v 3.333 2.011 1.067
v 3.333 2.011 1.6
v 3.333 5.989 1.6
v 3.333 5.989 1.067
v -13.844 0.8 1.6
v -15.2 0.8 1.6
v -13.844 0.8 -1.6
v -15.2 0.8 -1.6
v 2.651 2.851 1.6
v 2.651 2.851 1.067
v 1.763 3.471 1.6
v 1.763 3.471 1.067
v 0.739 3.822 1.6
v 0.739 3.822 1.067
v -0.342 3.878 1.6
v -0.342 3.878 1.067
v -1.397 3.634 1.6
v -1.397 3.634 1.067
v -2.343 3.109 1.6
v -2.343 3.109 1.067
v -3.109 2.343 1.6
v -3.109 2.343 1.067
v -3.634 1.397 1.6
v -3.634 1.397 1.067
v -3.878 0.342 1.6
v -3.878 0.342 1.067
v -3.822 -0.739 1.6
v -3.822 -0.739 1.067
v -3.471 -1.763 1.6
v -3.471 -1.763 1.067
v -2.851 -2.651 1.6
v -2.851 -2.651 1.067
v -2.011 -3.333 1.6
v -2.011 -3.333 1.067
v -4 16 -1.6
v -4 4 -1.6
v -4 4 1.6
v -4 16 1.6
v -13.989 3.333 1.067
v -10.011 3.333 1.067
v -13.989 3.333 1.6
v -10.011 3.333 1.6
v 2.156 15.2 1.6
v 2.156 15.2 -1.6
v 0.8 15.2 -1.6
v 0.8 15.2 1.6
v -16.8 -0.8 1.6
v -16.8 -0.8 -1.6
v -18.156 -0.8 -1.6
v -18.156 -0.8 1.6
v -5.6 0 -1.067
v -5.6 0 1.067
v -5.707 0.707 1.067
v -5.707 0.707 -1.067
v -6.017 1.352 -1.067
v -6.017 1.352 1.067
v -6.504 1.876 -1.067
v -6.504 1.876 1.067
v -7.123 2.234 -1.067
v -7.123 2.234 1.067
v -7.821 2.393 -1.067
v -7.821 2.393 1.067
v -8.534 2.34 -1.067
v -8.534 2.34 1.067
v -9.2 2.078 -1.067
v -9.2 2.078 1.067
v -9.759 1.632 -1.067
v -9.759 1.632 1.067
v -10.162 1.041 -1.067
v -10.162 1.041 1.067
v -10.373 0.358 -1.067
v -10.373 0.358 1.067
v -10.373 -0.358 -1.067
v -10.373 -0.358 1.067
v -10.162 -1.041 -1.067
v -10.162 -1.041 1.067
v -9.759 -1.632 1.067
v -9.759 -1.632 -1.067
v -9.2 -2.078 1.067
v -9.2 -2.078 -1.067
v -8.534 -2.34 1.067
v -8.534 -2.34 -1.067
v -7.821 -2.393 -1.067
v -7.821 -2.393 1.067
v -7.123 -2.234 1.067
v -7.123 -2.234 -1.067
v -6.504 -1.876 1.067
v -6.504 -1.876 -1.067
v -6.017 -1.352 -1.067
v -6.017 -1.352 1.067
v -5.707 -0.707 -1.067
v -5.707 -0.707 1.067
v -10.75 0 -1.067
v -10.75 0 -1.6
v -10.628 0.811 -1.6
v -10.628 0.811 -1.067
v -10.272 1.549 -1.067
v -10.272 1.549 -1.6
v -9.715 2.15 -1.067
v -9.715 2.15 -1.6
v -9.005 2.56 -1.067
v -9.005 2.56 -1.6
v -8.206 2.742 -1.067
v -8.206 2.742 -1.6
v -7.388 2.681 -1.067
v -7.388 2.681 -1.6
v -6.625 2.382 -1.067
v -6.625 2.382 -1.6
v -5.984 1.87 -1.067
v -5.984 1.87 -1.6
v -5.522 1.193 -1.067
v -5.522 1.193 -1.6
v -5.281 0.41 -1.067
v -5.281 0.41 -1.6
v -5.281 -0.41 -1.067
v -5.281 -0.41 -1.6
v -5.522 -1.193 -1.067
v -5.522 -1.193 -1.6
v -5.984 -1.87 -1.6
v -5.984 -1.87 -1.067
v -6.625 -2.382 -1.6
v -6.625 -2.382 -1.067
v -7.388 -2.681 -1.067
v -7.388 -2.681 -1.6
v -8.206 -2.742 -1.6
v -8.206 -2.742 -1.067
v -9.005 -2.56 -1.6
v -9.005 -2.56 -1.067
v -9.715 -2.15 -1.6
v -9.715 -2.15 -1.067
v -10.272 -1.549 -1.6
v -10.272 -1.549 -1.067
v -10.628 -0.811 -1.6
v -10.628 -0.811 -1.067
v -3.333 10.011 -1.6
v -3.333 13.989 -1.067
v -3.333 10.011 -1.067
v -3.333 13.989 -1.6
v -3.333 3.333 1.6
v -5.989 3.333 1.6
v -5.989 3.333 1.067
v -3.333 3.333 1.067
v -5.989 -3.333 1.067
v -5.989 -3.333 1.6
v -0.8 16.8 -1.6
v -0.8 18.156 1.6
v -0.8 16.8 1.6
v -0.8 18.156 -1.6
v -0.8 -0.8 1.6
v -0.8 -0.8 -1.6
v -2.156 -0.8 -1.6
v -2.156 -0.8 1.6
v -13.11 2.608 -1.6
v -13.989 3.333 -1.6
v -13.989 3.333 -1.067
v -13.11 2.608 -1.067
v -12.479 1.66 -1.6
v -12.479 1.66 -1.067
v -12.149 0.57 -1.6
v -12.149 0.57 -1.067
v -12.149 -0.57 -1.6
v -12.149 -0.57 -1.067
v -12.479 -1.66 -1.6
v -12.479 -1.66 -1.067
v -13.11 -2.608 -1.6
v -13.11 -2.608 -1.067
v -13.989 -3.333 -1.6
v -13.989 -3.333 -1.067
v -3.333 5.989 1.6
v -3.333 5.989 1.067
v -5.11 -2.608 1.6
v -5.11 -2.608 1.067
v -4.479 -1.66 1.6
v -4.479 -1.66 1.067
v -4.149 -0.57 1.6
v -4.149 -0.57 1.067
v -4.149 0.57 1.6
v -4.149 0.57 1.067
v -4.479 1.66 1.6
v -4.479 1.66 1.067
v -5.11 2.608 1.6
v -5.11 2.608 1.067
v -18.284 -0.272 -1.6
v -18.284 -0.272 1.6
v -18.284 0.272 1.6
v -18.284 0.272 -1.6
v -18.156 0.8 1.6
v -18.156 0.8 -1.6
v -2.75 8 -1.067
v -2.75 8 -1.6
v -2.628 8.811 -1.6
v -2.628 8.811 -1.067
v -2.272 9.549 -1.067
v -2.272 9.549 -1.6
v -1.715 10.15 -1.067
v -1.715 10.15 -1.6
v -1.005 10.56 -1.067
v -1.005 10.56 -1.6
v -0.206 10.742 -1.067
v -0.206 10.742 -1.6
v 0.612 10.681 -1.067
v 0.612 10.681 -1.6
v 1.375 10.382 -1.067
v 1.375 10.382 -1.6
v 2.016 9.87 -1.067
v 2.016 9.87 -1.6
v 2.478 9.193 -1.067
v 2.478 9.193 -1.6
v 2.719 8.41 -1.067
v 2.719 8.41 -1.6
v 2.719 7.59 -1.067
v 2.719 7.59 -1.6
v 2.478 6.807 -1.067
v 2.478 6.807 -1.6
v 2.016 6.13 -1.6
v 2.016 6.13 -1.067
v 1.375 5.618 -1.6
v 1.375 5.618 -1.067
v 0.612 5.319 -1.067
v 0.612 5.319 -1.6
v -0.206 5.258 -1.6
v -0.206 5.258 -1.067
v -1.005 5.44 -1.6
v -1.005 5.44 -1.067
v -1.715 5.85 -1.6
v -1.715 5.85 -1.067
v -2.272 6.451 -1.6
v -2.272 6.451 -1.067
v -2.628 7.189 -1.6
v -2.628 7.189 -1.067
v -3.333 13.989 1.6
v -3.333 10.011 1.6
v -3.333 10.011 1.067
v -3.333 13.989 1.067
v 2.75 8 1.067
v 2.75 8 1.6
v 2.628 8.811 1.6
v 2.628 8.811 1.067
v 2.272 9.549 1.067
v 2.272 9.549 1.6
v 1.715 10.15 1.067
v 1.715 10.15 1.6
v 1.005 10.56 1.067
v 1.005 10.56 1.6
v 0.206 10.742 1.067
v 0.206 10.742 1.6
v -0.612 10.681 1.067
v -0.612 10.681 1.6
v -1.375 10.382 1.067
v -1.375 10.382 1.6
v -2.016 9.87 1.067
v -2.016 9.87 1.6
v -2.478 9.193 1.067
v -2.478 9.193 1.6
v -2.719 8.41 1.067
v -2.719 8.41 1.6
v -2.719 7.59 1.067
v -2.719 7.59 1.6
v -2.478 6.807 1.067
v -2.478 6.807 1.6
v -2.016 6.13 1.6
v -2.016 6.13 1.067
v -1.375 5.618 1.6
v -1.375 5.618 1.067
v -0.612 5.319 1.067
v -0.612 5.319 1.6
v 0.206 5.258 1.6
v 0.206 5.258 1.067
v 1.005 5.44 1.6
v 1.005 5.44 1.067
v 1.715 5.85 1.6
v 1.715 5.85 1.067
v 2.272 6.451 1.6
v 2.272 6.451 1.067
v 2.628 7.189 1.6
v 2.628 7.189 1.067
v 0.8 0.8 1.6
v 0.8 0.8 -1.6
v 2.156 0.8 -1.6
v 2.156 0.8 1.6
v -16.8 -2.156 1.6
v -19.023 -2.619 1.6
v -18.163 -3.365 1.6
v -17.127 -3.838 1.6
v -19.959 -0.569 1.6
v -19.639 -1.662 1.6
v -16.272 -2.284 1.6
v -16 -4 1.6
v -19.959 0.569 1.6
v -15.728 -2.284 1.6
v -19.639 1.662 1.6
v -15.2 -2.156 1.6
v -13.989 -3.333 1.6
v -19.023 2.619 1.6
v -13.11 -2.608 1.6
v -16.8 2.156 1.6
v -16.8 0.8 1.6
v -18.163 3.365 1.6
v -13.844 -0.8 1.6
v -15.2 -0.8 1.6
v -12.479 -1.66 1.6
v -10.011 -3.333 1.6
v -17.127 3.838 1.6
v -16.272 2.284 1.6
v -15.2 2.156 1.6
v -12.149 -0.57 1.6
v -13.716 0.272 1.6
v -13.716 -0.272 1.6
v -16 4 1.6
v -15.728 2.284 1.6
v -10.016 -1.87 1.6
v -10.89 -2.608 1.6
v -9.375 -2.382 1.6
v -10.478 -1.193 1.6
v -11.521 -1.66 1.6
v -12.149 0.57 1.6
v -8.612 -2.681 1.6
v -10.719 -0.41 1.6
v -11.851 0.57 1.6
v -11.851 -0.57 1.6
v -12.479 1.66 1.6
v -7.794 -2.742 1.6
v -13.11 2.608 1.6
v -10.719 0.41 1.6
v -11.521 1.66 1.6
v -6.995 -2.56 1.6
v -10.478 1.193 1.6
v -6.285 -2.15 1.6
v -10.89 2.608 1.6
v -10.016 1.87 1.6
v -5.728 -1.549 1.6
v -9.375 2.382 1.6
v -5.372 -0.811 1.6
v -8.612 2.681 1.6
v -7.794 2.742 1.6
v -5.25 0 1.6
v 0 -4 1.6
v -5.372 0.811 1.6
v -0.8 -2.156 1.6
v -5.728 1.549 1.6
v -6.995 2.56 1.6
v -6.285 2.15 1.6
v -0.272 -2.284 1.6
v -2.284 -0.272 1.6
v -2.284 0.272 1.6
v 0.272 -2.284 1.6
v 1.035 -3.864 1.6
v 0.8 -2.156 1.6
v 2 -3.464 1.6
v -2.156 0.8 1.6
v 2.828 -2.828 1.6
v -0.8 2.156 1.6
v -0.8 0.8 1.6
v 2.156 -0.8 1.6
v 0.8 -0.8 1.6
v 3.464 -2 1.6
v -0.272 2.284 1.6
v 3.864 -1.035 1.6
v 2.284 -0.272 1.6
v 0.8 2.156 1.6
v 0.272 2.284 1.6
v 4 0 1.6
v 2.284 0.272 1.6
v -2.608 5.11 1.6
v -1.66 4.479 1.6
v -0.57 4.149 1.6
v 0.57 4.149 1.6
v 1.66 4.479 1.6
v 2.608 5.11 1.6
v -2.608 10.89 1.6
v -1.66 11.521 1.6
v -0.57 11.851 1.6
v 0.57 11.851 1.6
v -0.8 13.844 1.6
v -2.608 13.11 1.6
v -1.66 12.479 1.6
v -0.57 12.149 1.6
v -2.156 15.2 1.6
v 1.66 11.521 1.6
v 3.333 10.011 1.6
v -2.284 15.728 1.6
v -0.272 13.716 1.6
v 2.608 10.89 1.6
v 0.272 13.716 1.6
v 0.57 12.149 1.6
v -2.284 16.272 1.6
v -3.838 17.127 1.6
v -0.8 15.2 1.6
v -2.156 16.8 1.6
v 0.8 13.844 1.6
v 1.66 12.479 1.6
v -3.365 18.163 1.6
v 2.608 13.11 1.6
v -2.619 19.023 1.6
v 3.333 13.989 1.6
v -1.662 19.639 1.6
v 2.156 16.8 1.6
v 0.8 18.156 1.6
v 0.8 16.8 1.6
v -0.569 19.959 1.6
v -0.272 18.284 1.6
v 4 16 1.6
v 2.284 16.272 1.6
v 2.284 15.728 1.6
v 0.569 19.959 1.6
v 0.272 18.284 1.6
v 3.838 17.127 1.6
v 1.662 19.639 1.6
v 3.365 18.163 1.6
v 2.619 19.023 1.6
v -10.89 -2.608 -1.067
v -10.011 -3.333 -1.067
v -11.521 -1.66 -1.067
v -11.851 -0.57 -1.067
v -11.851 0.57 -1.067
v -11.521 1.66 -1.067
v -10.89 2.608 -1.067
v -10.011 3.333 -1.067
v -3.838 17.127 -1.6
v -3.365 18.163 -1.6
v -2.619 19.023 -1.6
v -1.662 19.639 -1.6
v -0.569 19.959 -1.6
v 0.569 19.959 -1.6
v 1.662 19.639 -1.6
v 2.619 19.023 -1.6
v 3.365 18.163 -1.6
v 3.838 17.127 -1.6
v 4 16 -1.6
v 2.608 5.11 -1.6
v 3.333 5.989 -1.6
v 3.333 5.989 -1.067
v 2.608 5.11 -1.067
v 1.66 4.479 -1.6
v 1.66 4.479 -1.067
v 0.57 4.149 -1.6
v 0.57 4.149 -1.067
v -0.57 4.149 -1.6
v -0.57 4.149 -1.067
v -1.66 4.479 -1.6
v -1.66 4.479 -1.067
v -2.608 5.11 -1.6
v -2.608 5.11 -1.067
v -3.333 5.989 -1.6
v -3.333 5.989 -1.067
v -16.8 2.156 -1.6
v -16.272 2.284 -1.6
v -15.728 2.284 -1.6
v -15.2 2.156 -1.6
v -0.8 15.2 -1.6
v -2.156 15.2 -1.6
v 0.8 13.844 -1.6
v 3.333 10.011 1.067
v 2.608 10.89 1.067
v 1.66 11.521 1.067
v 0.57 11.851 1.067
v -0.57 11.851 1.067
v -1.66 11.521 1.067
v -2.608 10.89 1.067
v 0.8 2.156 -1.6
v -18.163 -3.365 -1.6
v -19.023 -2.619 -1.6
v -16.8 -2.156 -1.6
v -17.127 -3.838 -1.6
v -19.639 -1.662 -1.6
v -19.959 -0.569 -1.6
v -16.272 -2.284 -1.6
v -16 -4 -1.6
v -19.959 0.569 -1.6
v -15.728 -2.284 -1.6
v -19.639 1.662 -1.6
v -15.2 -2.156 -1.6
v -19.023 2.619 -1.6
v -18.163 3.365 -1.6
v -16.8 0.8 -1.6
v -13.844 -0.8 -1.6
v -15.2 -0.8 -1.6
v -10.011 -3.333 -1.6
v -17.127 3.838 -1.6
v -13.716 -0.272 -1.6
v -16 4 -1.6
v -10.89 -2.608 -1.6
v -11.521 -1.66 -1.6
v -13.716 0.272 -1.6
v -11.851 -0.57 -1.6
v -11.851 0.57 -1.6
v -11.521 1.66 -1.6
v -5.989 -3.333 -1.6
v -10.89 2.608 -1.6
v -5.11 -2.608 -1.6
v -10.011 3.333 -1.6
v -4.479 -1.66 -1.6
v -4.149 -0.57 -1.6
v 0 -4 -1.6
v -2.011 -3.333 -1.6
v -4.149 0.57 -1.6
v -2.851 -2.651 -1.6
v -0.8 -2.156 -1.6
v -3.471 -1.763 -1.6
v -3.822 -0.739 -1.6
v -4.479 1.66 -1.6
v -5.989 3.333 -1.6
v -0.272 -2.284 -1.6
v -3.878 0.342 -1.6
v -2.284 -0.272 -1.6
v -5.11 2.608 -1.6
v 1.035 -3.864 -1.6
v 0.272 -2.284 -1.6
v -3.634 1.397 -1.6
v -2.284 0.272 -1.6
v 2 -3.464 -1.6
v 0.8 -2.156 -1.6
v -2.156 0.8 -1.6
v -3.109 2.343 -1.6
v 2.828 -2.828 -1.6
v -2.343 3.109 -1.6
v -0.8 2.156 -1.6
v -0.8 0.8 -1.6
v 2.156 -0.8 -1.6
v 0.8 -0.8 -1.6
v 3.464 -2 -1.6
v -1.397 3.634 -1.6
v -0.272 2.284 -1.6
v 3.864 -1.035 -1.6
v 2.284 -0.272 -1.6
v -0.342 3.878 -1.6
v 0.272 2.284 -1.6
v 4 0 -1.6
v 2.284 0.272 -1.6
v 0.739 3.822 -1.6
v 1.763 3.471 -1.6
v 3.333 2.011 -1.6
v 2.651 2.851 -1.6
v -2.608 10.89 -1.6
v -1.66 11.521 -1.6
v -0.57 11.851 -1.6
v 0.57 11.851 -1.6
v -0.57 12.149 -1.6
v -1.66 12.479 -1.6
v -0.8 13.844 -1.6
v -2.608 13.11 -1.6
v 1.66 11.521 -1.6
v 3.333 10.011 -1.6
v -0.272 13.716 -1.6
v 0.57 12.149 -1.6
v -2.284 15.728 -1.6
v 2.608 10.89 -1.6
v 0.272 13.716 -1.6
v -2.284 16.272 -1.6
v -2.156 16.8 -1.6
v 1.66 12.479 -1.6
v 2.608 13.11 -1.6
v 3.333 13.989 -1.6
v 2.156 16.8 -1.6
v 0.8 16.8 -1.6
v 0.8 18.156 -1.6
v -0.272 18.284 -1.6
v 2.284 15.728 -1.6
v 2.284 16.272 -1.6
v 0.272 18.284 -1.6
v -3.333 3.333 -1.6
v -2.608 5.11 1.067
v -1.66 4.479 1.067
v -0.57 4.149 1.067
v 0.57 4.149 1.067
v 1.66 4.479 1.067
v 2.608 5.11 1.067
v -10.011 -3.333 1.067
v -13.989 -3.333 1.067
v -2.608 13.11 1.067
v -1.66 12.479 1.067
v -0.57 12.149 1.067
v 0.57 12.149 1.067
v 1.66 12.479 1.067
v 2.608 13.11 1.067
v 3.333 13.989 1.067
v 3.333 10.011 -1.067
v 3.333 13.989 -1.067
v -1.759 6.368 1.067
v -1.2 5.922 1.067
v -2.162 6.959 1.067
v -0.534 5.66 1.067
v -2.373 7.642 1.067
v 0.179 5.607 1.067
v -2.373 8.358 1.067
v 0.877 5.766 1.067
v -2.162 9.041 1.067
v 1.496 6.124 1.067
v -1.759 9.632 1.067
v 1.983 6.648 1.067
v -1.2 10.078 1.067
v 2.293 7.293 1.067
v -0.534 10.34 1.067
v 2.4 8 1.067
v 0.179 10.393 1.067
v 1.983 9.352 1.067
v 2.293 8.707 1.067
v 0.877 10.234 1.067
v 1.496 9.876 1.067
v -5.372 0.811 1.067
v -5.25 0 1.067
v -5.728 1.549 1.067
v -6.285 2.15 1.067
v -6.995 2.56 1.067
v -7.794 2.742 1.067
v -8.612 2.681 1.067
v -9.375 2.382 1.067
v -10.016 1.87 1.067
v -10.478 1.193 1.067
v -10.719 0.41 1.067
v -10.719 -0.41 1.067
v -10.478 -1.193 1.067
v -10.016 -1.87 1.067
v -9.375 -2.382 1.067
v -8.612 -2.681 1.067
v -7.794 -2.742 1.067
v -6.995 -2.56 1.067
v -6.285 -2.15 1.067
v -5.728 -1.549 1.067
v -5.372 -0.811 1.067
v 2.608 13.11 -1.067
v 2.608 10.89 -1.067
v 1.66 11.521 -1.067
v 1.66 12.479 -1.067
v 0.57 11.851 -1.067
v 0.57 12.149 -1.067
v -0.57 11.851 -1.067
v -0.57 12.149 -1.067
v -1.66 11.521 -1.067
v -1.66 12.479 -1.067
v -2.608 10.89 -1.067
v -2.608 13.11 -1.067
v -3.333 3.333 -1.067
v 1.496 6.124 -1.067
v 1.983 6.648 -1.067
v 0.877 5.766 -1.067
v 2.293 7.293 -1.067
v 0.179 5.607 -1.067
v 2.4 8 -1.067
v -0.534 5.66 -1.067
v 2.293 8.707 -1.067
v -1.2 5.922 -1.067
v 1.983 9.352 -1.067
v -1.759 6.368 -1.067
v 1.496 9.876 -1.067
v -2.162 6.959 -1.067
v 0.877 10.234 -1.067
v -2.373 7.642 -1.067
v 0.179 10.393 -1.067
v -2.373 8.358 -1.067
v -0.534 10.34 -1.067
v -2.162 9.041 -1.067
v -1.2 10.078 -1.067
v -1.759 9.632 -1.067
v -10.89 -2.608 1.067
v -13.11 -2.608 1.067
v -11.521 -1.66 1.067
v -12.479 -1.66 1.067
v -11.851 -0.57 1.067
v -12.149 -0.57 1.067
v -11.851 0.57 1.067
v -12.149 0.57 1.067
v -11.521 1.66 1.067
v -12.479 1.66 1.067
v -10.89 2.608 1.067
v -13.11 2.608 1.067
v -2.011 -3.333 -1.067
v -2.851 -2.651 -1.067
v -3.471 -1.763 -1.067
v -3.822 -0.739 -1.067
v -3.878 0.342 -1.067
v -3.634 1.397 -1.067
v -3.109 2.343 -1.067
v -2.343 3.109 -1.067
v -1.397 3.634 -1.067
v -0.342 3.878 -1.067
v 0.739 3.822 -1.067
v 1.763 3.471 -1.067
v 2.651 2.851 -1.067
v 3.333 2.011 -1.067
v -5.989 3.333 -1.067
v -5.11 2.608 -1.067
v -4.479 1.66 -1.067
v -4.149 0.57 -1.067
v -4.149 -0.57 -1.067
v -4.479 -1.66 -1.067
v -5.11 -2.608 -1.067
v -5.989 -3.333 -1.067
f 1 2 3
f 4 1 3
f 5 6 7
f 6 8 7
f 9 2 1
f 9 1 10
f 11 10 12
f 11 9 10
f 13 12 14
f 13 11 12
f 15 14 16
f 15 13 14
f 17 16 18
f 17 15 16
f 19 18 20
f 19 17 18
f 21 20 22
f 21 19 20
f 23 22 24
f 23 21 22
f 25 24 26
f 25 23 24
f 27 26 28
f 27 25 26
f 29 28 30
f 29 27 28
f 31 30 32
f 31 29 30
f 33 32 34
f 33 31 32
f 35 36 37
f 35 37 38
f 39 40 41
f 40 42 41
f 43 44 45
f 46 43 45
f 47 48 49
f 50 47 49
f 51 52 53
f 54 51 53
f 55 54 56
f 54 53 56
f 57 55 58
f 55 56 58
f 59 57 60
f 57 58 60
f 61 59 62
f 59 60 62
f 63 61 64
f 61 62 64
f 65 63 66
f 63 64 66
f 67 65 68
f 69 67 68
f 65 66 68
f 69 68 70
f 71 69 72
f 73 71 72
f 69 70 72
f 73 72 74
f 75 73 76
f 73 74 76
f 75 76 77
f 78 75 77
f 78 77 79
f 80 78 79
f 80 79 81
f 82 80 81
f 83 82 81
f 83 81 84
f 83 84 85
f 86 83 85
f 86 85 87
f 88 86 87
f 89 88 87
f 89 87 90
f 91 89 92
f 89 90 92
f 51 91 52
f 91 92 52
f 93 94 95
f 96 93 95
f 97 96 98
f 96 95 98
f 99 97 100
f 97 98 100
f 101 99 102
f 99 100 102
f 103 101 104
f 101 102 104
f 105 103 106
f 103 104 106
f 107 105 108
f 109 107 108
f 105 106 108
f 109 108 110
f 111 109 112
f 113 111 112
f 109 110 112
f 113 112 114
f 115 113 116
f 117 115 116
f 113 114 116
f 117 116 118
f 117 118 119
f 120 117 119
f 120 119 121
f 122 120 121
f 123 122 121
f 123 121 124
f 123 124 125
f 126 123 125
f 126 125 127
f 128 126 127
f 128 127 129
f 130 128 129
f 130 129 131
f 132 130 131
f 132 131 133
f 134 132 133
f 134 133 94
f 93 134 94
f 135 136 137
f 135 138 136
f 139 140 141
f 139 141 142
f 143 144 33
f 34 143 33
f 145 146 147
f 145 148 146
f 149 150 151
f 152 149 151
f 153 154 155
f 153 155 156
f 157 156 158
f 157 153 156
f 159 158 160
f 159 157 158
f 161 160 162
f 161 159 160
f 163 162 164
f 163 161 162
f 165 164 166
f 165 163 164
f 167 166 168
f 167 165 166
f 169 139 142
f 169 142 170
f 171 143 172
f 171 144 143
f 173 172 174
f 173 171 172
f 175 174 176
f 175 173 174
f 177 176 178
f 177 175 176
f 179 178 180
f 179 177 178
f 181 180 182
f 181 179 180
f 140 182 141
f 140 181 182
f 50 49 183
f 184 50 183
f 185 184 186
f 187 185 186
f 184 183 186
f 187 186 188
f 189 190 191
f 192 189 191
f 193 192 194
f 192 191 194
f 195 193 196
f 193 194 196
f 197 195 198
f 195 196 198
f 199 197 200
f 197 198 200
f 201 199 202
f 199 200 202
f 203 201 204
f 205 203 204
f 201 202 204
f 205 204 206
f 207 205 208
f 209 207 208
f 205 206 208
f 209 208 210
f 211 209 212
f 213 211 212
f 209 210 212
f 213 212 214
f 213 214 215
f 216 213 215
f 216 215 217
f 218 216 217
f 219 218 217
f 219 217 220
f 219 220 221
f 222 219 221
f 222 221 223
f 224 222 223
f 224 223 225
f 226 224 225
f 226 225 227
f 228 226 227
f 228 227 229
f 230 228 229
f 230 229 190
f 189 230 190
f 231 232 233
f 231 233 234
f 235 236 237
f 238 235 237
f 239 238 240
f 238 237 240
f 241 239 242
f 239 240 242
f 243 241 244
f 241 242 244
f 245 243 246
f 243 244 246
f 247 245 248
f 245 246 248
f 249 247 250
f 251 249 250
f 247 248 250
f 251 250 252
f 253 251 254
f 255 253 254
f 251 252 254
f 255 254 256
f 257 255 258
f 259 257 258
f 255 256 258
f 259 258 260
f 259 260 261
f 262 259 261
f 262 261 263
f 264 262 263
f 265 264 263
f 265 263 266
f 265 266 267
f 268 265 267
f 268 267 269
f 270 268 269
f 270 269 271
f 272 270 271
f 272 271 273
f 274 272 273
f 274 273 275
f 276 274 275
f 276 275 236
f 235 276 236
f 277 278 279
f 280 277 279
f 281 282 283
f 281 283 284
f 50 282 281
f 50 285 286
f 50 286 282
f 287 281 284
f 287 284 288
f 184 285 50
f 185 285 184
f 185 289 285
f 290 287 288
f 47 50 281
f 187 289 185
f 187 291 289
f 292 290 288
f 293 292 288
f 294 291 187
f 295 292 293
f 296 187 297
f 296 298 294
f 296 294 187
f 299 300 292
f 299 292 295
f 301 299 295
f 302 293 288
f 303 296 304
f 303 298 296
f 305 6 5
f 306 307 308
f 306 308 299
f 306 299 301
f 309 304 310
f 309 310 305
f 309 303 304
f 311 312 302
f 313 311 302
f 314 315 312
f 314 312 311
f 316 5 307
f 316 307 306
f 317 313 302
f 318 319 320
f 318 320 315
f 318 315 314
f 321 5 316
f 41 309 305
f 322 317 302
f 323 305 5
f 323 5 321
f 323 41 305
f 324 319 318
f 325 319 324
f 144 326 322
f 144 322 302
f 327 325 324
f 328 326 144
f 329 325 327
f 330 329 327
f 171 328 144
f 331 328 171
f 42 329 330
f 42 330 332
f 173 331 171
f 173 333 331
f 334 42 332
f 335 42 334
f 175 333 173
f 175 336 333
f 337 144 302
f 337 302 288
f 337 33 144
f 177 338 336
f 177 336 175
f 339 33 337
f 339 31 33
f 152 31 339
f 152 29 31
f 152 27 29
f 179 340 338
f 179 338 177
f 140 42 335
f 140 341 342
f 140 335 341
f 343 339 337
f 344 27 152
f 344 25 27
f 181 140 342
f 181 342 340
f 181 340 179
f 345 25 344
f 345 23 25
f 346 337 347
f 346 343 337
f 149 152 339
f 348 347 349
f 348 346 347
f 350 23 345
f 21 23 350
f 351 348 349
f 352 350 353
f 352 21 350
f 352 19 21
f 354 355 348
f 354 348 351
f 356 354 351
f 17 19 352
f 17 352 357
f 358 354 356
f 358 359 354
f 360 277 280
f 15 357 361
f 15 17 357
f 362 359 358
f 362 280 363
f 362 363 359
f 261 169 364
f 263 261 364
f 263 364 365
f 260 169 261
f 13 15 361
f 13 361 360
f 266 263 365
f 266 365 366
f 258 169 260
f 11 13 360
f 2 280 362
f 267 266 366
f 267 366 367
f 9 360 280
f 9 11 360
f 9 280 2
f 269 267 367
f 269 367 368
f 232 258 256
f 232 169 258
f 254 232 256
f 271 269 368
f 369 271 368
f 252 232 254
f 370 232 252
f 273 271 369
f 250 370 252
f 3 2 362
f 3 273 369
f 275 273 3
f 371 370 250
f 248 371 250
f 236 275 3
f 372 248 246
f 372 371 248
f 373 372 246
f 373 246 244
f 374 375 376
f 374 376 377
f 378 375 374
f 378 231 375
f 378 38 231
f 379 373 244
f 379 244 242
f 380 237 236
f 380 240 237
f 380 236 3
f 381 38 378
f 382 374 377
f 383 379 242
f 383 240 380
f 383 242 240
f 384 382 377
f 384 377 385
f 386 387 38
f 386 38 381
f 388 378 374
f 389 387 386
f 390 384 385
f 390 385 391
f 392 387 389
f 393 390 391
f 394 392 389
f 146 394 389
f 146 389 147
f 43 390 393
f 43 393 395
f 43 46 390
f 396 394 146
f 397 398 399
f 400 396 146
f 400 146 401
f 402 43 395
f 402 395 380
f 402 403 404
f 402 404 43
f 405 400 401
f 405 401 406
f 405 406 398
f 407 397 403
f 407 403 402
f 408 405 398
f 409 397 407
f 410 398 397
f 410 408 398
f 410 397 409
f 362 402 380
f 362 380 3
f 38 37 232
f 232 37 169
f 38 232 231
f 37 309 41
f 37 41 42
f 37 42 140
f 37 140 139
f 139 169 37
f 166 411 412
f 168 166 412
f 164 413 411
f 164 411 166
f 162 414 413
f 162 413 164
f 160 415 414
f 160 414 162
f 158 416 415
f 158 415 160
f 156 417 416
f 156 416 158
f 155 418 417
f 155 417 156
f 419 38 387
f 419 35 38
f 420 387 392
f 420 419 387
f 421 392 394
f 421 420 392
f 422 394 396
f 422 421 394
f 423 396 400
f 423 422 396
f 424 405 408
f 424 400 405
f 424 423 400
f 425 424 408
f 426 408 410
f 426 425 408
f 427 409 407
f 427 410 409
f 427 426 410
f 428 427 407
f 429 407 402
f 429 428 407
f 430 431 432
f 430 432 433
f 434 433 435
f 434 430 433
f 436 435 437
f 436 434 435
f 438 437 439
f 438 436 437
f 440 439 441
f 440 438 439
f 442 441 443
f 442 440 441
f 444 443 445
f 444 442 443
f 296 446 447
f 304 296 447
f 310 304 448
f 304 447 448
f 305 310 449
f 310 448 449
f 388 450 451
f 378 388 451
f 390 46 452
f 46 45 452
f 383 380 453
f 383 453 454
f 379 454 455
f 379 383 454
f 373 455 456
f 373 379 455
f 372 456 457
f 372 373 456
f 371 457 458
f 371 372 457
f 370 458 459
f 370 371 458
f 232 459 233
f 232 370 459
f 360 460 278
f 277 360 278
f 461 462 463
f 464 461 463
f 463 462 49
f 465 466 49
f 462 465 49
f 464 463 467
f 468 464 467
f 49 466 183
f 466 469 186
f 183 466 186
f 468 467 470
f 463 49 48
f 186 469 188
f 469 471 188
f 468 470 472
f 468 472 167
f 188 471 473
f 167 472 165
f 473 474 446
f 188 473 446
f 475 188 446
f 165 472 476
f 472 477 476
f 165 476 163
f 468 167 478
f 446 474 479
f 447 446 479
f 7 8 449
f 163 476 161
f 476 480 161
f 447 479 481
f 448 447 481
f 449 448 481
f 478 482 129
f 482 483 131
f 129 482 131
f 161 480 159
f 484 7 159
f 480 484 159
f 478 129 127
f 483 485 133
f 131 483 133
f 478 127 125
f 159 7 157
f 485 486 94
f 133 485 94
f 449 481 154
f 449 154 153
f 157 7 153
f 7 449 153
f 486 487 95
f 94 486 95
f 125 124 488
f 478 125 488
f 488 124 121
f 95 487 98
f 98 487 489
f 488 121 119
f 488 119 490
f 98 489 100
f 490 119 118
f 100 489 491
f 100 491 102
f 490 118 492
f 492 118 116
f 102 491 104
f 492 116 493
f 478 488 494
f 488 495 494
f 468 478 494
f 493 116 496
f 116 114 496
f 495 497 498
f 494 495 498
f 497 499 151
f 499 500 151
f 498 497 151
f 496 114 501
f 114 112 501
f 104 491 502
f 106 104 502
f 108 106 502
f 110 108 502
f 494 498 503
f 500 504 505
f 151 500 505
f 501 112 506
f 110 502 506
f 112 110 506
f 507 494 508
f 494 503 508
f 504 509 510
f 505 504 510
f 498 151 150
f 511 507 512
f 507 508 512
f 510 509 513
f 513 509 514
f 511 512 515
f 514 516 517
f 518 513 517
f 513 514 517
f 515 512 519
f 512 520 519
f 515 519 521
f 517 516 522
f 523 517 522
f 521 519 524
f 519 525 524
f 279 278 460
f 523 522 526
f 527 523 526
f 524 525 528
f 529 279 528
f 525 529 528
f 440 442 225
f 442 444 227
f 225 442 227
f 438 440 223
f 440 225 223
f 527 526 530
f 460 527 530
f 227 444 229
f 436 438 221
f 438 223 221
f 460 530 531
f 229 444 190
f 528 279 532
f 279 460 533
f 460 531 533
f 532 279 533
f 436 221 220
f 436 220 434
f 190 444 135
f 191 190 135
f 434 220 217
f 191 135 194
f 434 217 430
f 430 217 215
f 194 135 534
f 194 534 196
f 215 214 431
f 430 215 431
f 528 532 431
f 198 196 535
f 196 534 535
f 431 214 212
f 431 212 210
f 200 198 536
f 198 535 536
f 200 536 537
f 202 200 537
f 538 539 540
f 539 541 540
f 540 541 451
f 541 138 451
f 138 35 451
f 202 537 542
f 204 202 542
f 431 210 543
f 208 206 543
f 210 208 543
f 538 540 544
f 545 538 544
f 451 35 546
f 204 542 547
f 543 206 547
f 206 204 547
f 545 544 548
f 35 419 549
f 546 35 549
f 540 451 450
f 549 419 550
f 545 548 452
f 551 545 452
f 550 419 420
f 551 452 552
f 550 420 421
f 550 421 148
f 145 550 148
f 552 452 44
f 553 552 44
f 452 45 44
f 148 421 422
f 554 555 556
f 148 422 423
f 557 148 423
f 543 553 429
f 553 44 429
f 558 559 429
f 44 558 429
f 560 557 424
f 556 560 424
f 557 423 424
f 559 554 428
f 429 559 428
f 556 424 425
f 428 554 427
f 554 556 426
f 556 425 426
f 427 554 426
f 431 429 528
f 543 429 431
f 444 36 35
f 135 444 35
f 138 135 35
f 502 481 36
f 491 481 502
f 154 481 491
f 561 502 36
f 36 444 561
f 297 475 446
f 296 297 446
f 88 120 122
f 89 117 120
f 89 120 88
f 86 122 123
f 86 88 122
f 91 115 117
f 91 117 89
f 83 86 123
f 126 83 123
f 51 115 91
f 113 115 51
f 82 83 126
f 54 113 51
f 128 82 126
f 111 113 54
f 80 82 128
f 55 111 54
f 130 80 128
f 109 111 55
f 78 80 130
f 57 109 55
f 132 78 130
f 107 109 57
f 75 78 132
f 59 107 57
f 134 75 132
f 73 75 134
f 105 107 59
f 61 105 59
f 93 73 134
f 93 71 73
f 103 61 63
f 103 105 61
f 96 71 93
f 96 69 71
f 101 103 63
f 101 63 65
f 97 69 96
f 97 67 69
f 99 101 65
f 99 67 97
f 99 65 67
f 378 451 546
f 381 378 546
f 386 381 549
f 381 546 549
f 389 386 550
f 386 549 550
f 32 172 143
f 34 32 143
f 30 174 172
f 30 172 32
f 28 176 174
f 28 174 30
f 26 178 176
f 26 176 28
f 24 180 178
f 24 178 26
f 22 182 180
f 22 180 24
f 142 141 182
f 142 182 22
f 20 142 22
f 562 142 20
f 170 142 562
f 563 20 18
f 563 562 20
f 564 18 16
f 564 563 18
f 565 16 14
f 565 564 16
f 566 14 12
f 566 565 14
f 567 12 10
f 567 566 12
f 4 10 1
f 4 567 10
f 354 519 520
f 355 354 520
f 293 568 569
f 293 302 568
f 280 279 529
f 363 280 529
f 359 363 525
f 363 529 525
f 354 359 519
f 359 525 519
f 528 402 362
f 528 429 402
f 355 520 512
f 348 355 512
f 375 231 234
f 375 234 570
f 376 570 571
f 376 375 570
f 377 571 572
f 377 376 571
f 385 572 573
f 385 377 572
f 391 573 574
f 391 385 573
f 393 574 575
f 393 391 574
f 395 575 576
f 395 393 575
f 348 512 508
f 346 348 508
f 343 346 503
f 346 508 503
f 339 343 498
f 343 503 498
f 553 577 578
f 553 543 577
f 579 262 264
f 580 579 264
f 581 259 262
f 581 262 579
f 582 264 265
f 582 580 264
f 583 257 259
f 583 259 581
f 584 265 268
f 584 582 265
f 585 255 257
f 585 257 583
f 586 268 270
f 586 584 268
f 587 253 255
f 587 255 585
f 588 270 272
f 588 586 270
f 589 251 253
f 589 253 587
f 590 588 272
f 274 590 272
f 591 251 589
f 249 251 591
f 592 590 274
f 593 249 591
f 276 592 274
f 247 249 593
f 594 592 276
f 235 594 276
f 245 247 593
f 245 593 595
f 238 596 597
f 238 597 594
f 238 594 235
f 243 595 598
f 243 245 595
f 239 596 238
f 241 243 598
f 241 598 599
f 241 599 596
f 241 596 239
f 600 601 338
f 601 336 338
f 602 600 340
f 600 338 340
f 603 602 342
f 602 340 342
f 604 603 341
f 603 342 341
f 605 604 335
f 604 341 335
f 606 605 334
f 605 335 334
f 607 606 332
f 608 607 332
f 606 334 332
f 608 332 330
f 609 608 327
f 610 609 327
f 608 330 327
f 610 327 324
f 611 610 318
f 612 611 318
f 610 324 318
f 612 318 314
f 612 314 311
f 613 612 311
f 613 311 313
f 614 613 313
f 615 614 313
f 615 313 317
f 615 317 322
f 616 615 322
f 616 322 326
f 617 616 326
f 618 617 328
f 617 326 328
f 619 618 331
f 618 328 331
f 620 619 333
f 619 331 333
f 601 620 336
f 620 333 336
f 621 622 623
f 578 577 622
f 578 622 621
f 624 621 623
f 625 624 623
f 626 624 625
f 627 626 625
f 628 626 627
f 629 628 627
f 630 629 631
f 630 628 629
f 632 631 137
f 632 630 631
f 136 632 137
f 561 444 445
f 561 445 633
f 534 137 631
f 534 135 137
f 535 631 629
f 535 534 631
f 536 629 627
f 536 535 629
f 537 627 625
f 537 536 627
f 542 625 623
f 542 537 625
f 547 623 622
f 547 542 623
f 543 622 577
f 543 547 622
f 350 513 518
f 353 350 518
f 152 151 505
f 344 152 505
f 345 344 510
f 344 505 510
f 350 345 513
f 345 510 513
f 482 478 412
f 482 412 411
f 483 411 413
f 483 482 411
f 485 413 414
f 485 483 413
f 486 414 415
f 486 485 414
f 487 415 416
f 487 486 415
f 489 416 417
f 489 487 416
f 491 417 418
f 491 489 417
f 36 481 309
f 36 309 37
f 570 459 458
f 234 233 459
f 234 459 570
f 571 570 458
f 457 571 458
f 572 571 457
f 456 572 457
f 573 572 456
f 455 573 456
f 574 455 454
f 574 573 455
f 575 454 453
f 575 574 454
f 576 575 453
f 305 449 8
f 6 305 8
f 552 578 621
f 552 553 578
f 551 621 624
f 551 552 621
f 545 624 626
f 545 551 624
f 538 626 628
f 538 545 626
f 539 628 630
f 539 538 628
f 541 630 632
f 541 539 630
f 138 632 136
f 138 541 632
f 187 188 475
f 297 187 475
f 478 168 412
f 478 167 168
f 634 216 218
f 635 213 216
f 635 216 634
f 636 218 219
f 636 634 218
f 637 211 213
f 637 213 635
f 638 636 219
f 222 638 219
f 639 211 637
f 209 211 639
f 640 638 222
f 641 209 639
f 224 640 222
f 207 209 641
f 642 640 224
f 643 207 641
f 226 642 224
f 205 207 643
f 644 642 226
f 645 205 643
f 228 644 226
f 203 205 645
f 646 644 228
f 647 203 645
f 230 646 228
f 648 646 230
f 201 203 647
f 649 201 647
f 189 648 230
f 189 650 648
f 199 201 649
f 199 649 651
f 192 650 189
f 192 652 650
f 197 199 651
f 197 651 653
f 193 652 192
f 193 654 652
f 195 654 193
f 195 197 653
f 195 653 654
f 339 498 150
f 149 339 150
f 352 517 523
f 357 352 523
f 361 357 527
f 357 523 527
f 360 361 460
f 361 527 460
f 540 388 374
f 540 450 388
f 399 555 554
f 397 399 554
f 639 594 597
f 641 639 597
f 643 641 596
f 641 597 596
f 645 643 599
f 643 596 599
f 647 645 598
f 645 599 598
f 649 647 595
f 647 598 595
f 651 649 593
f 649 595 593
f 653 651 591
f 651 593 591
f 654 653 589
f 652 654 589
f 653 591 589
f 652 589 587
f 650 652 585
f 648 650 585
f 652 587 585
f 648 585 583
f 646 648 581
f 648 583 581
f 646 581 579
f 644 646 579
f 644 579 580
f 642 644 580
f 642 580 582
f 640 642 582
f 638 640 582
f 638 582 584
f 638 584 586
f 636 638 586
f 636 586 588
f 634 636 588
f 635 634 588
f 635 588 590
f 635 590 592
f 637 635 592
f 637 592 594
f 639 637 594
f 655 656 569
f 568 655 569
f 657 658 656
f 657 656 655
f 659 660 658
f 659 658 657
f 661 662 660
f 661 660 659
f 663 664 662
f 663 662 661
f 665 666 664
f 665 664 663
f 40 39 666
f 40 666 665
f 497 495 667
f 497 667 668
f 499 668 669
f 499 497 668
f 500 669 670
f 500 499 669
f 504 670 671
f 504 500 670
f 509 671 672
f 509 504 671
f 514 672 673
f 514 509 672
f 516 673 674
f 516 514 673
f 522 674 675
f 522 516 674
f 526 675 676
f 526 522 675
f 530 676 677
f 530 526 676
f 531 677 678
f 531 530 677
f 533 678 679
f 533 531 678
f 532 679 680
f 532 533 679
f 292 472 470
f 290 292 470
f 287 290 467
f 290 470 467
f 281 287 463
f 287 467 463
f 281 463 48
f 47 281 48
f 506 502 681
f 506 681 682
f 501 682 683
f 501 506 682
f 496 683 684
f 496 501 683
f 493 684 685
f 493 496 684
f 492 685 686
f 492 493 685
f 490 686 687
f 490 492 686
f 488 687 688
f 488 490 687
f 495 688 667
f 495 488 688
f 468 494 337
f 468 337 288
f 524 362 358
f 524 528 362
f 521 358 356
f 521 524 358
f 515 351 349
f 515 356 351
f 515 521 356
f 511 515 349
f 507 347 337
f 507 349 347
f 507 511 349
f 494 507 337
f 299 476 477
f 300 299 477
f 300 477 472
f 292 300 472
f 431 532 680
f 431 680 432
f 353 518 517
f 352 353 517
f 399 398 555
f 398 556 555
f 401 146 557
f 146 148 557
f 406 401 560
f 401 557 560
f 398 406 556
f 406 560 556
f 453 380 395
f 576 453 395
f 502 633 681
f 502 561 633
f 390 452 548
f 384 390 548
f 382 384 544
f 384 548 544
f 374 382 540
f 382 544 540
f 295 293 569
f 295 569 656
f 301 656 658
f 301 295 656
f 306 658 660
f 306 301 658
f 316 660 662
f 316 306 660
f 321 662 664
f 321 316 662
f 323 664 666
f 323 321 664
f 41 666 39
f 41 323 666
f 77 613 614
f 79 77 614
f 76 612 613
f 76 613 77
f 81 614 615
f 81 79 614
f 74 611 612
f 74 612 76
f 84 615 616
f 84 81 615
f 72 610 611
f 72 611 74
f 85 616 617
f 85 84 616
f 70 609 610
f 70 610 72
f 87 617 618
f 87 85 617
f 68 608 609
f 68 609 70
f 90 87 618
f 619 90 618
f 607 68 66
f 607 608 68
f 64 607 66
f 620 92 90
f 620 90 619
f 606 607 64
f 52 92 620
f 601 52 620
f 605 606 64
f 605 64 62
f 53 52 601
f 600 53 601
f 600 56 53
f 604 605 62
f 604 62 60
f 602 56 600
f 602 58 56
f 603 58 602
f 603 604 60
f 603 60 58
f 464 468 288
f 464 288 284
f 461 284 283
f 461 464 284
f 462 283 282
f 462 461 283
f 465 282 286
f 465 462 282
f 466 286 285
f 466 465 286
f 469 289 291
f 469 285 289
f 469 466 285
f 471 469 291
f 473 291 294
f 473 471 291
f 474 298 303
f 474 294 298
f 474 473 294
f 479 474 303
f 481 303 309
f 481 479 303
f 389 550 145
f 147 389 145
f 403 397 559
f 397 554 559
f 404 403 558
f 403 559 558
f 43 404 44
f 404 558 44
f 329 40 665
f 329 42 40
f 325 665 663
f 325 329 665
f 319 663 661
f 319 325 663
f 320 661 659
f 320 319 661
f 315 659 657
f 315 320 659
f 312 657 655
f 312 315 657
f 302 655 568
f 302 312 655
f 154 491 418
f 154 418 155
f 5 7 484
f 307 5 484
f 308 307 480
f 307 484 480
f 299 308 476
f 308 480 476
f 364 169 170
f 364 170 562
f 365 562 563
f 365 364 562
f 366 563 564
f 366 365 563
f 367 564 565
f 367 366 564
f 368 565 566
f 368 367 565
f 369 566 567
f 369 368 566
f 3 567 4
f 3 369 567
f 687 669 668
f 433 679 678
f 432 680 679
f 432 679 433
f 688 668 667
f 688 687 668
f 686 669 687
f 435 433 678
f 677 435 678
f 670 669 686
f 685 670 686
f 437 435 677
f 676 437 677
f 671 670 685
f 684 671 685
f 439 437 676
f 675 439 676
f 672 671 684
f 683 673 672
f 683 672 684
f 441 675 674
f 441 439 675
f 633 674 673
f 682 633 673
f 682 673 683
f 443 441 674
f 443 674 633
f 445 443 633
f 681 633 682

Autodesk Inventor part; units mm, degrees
ref_plane "YZ Plane" through (0, 0, 0) normal (1, 0, 0) x (0, 1, 0)
ref_plane "XZ Plane" through (0, 0, 0) normal (0, 1, 0) x (-1, 0, 0)
ref_plane "XY Plane" through (0, 0, 0) normal (0, 0, 1) x (1, 0, 0)
sketch "Sketch1" plane through (0, 0, 0) normal (0, 0, 1) x (1, 0, 0)
  line L0 (0, -9.7941) -> (0, 24.9657) construction
  line L1 (-24.9657, 0) -> (9.7941, 0) construction
  line L2 (-4, 4) -> (-4, 16)
  arc A0 (4, 16) -> (-4, 16) centre (0, 16) ccw
  line L3 (4, 16) -> (4, 0)
  arc A1 (0, -4) -> (4, 0) centre (0, 0) ccw
  line L4 (0, -4) -> (-16, -4)
  arc A2 (-16, 4) -> (-16, -4) centre (-16, 0) ccw
  line L5 (-16, 4) -> (-4, 4)
  dimension "d38" = 8
  dimension "d39" = 24
sketch "Sketch6" plane through (0, 0, 0) normal (0, 0, 1) x (1, 0, 0)
  circle A0 centre (-16, 0) radius 2.3
  circle A1 centre (0, 16) radius 2.3
  line L0 (-18.1564, 0.8) -> (-16.8, 0.8)
  line L1 (-16.8, 0.8) -> (-16.8, 2.1564)
  line L2 (-15.2, 2.1564) -> (-15.2, 0.8)
  line L3 (-15.2, 0.8) -> (-13.8436, 0.8)
  line L4 (-13.8436, -0.8) -> (-15.2, -0.8)
  line L5 (-15.2, -0.8) -> (-15.2, -2.1564)
  line L6 (-16.8, -2.1564) -> (-16.8, -0.8)
  line L7 (-16.8, -0.8) -> (-18.1564, -0.8)
  line L8 (-2.1564, 16.8) -> (-0.8, 16.8)
  line L9 (0.8, 16.8) -> (2.1564, 16.8)
  line L10 (0.8, 18.1564) -> (0.8, 16.8)
  line L11 (0.8, 15.2) -> (0.8, 13.8436)
  line L12 (-0.8, 18.1564) -> (-0.8, 16.8)
  line L13 (-0.8, 15.2) -> (-0.8, 13.8436)
  line L14 (2.1564, 15.2) -> (0.8, 15.2)
  line L15 (-0.8, 15.2) -> (-2.1564, 15.2)
  arc A2 (0, -4) -> (4, 0) centre (0, 0) ccw construction
  arc A3 (4, 16) -> (-4, 16) centre (0, 16) ccw construction
  arc A4 (-16, 4) -> (-16, -4) centre (-16, 0) ccw construction
  circle A5 centre (0, 0) radius 2.3
  line L16 (-2.1564, 0.8) -> (-0.8, 0.8)
  line L17 (-0.8, 0.8) -> (-0.8, 2.1564)
  line L18 (0.8, 2.1564) -> (0.8, 0.8)
  line L19 (0.8, 0.8) -> (2.1564, 0.8)
  line L20 (2.1564, -0.8) -> (0.8, -0.8)
  line L21 (0.8, -0.8) -> (0.8, -2.1564)
  line L22 (-0.8, -2.1564) -> (-0.8, -0.8)
  line L23 (-0.8, -0.8) -> (-2.1564, -0.8)
  circle A6 centre (0, 0) radius 2.75
  circle A7 centre (-16, 0) radius 2.75
  circle A8 centre (0, 16) radius 2.75
  dimension "d40" = 4.6
  dimension "d41" = 1.6
  dimension "d50" = 5.5
sketch "Sketch8" plane through (0, 0, 0) normal (0, 0, 1) x (1, 0, 0)
  arc A0 (0, -4) -> (4, 0) centre (0, 0) ccw construction
  line L0 (0, -8.9941) -> (0, 20.1657) construction
  line L1 (-20.1657, 0) -> (8.9941, 0) construction
  circle A1 centre (0, 8) radius 2.4
  circle A2 centre (-8, 0) radius 2.4
  circle A3 centre (0, 8) radius 2.75
  circle A4 centre (-8, 0) radius 2.75
  line L2 (0, -4) -> (-16, -4) construction
  line L3 (4, 16) -> (4, 0) construction
  point P0 (4, 8)
  point P1 (-8, -4)
  dimension "d42" = 4.8
  dimension "d43" = 5.5
extrude "Extrusion1" add sketch "Sketch1" along normal mid plane 3.2
extrude "Extrusion9" cut sketch "Sketch6" along normal through all both and the other way through all contours A0 L4 L5 L6 L7 L0 L1 L2 L3 | A1 L14 L11 L13 L15 L8 L12 L10 L9 | A5 L20 L21 L22 L23 L16 L17 L18 L19
extrude "Extrusion10" cut sketch "Sketch8" along normal through all both and the other way through all contours A1 | A2
sketch "Sketch3" plane through (0, 0, 1.6) normal (0, 0, 1) x (1, 0, 0)
  circle A0 centre (-8, 0) radius 2.75 projected
  circle A1 centre (0, 8) radius 2.75 projected
extrude "Extrusion4" cut sketch "Sketch3" against normal blind 0.5333
sketch "Sketch9" plane through (0, 0, -1.6) normal (0, 0, -1) x (-1, 0, 0)
  circle A0 centre (8, 0) radius 2.75 projected
  circle A1 centre (0, 8) radius 2.75 projected
extrude "Extrusion11" cut sketch "Sketch9" against normal blind 0.5333
sketch "Sketch4" plane through (0, 0, 1.6) normal (0, 0, 1) x (1, 0, 0)
  circle A0 centre (-16, 0) radius 2.3 construction
  circle A1 centre (0, 16) radius 2.3 construction
  arc A2 (-5.9892, -3.3333) -> (-5.9892, 3.3333) centre (-8, 0) ccw
  line L0 (-5.9892, 3.3333) -> (-2.0108, 3.3333)
  line L1 (-5.9892, -3.3333) -> (-2.0108, -3.3333)
  arc A3 (-2.0108, 3.3333) -> (-2.0108, -3.3333) centre (0, 0) ccw
  circle A4 centre (0, 0) radius 2.75 construction
  circle A5 centre (0, 16) radius 2.75 construction
  circle A6 centre (-16, 0) radius 2.75 construction
  line L2 (0, -9.5229) -> (0, 24.9205) construction
  line L3 (-25.4536, 0) -> (12.7217, 0) construction
  circle A7 centre (-8, 0) radius 2.75 construction
  circle A8 centre (0, 8) radius 2.75 construction
  arc A9 (-10.0108, 3.3333) -> (-10.0108, -3.3333) centre (-8, 0) ccw
  arc A10 (-13.9892, -3.3333) -> (-13.9892, 3.3333) centre (-16, 0) ccw
  line L4 (-10.0108, -3.3333) -> (-13.9892, -3.3333)
  line L5 (-10.0108, 3.3333) -> (-13.9892, 3.3333)
  arc A11 (3.3333, 2.0108) -> (-3.3333, 2.0108) centre (0, 0) ccw
  arc A12 (-3.3333, 5.9892) -> (3.3333, 5.9892) centre (0, 8) ccw
  line L6 (3.3333, 2.0108) -> (3.3333, 5.9892)
  line L7 (-3.3333, 2.0108) -> (-3.3333, 5.9892)
  line L8 (3.3333, 10.0108) -> (3.3333, 13.9892)
  line L9 (-3.3333, 10.0108) -> (-3.3333, 13.9892)
  arc A13 (-3.3333, 13.9892) -> (3.3333, 13.9892) centre (0, 16) ccw
  arc A14 (3.3333, 10.0108) -> (-3.3333, 10.0108) centre (0, 8) ccw
  dimension "d33" = 6.6667
  dimension "d51" = 1.1429
  dimension "d52" = 6.6667
extrude "Extrusion5" cut sketch "Sketch4" against normal blind 0.5333
sketch "Sketch10" plane through (0, 0, -1.6) normal (0, 0, -1) x (-1, 0, 0)
  arc A0 (-3.3333, 13.9892) -> (3.3333, 13.9892) centre (0, 16) ccw projected
  line L0 (3.3333, 13.9892) -> (3.3333, 10.0108) projected
  arc A1 (3.3333, 10.0108) -> (-3.3333, 10.0108) centre (0, 8) ccw projected
  line L1 (-3.3333, 10.0108) -> (-3.3333, 13.9892) projected
  arc A2 (2.0108, -3.3333) -> (-3.3333, 2.0108) centre (0, 0) ccw projected
  line L2 (-3.3333, 2.0108) -> (-3.3333, 5.9892) projected
  arc A3 (-3.3333, 5.9892) -> (3.3333, 5.9892) centre (0, 8) ccw projected
  line L3 (3.3333, 5.9892) -> (3.3333, 3.3333) projected
  line L4 (3.3333, 3.3333) -> (5.9892, 3.3333) projected
  arc A4 (5.9892, 3.3333) -> (5.9892, -3.3333) centre (8, 0) ccw projected
  line L5 (5.9892, -3.3333) -> (2.0108, -3.3333) projected
  line L6 (10.0108, 3.3333) -> (13.9892, 3.3333) projected
  arc A5 (13.9892, 3.3333) -> (13.9892, -3.3333) centre (16, 0) ccw projected
  line L7 (13.9892, -3.3333) -> (10.0108, -3.3333) projected
  arc A6 (10.0108, -3.3333) -> (10.0108, 3.3333) centre (8, 0) ccw projected
extrude "Extrusion12" cut sketch "Sketch10" against normal blind 0.5333
equation "\"d38\" = width_standard"
equation "\"d2\" = 0.333333 * height_standard"
equation "\"d15\" = 0.0555556 * height_standard"
equation "\"d48\" = 0.0555556 * height_standard"
equation "\"d33\" = 0.833333 * width_standard"
equation "\"d52\" = 0.833333 * width_standard"
equation "\"d20\" = 0.0555556 * height_standard"
equation "\"d53\" = 0.0555556 * height_standard"
equation "\"width_standard\" = 8"
equation "\"height_standard\" = 9.6"
properties part number "LEGO Brick 32017" material "Steel"
